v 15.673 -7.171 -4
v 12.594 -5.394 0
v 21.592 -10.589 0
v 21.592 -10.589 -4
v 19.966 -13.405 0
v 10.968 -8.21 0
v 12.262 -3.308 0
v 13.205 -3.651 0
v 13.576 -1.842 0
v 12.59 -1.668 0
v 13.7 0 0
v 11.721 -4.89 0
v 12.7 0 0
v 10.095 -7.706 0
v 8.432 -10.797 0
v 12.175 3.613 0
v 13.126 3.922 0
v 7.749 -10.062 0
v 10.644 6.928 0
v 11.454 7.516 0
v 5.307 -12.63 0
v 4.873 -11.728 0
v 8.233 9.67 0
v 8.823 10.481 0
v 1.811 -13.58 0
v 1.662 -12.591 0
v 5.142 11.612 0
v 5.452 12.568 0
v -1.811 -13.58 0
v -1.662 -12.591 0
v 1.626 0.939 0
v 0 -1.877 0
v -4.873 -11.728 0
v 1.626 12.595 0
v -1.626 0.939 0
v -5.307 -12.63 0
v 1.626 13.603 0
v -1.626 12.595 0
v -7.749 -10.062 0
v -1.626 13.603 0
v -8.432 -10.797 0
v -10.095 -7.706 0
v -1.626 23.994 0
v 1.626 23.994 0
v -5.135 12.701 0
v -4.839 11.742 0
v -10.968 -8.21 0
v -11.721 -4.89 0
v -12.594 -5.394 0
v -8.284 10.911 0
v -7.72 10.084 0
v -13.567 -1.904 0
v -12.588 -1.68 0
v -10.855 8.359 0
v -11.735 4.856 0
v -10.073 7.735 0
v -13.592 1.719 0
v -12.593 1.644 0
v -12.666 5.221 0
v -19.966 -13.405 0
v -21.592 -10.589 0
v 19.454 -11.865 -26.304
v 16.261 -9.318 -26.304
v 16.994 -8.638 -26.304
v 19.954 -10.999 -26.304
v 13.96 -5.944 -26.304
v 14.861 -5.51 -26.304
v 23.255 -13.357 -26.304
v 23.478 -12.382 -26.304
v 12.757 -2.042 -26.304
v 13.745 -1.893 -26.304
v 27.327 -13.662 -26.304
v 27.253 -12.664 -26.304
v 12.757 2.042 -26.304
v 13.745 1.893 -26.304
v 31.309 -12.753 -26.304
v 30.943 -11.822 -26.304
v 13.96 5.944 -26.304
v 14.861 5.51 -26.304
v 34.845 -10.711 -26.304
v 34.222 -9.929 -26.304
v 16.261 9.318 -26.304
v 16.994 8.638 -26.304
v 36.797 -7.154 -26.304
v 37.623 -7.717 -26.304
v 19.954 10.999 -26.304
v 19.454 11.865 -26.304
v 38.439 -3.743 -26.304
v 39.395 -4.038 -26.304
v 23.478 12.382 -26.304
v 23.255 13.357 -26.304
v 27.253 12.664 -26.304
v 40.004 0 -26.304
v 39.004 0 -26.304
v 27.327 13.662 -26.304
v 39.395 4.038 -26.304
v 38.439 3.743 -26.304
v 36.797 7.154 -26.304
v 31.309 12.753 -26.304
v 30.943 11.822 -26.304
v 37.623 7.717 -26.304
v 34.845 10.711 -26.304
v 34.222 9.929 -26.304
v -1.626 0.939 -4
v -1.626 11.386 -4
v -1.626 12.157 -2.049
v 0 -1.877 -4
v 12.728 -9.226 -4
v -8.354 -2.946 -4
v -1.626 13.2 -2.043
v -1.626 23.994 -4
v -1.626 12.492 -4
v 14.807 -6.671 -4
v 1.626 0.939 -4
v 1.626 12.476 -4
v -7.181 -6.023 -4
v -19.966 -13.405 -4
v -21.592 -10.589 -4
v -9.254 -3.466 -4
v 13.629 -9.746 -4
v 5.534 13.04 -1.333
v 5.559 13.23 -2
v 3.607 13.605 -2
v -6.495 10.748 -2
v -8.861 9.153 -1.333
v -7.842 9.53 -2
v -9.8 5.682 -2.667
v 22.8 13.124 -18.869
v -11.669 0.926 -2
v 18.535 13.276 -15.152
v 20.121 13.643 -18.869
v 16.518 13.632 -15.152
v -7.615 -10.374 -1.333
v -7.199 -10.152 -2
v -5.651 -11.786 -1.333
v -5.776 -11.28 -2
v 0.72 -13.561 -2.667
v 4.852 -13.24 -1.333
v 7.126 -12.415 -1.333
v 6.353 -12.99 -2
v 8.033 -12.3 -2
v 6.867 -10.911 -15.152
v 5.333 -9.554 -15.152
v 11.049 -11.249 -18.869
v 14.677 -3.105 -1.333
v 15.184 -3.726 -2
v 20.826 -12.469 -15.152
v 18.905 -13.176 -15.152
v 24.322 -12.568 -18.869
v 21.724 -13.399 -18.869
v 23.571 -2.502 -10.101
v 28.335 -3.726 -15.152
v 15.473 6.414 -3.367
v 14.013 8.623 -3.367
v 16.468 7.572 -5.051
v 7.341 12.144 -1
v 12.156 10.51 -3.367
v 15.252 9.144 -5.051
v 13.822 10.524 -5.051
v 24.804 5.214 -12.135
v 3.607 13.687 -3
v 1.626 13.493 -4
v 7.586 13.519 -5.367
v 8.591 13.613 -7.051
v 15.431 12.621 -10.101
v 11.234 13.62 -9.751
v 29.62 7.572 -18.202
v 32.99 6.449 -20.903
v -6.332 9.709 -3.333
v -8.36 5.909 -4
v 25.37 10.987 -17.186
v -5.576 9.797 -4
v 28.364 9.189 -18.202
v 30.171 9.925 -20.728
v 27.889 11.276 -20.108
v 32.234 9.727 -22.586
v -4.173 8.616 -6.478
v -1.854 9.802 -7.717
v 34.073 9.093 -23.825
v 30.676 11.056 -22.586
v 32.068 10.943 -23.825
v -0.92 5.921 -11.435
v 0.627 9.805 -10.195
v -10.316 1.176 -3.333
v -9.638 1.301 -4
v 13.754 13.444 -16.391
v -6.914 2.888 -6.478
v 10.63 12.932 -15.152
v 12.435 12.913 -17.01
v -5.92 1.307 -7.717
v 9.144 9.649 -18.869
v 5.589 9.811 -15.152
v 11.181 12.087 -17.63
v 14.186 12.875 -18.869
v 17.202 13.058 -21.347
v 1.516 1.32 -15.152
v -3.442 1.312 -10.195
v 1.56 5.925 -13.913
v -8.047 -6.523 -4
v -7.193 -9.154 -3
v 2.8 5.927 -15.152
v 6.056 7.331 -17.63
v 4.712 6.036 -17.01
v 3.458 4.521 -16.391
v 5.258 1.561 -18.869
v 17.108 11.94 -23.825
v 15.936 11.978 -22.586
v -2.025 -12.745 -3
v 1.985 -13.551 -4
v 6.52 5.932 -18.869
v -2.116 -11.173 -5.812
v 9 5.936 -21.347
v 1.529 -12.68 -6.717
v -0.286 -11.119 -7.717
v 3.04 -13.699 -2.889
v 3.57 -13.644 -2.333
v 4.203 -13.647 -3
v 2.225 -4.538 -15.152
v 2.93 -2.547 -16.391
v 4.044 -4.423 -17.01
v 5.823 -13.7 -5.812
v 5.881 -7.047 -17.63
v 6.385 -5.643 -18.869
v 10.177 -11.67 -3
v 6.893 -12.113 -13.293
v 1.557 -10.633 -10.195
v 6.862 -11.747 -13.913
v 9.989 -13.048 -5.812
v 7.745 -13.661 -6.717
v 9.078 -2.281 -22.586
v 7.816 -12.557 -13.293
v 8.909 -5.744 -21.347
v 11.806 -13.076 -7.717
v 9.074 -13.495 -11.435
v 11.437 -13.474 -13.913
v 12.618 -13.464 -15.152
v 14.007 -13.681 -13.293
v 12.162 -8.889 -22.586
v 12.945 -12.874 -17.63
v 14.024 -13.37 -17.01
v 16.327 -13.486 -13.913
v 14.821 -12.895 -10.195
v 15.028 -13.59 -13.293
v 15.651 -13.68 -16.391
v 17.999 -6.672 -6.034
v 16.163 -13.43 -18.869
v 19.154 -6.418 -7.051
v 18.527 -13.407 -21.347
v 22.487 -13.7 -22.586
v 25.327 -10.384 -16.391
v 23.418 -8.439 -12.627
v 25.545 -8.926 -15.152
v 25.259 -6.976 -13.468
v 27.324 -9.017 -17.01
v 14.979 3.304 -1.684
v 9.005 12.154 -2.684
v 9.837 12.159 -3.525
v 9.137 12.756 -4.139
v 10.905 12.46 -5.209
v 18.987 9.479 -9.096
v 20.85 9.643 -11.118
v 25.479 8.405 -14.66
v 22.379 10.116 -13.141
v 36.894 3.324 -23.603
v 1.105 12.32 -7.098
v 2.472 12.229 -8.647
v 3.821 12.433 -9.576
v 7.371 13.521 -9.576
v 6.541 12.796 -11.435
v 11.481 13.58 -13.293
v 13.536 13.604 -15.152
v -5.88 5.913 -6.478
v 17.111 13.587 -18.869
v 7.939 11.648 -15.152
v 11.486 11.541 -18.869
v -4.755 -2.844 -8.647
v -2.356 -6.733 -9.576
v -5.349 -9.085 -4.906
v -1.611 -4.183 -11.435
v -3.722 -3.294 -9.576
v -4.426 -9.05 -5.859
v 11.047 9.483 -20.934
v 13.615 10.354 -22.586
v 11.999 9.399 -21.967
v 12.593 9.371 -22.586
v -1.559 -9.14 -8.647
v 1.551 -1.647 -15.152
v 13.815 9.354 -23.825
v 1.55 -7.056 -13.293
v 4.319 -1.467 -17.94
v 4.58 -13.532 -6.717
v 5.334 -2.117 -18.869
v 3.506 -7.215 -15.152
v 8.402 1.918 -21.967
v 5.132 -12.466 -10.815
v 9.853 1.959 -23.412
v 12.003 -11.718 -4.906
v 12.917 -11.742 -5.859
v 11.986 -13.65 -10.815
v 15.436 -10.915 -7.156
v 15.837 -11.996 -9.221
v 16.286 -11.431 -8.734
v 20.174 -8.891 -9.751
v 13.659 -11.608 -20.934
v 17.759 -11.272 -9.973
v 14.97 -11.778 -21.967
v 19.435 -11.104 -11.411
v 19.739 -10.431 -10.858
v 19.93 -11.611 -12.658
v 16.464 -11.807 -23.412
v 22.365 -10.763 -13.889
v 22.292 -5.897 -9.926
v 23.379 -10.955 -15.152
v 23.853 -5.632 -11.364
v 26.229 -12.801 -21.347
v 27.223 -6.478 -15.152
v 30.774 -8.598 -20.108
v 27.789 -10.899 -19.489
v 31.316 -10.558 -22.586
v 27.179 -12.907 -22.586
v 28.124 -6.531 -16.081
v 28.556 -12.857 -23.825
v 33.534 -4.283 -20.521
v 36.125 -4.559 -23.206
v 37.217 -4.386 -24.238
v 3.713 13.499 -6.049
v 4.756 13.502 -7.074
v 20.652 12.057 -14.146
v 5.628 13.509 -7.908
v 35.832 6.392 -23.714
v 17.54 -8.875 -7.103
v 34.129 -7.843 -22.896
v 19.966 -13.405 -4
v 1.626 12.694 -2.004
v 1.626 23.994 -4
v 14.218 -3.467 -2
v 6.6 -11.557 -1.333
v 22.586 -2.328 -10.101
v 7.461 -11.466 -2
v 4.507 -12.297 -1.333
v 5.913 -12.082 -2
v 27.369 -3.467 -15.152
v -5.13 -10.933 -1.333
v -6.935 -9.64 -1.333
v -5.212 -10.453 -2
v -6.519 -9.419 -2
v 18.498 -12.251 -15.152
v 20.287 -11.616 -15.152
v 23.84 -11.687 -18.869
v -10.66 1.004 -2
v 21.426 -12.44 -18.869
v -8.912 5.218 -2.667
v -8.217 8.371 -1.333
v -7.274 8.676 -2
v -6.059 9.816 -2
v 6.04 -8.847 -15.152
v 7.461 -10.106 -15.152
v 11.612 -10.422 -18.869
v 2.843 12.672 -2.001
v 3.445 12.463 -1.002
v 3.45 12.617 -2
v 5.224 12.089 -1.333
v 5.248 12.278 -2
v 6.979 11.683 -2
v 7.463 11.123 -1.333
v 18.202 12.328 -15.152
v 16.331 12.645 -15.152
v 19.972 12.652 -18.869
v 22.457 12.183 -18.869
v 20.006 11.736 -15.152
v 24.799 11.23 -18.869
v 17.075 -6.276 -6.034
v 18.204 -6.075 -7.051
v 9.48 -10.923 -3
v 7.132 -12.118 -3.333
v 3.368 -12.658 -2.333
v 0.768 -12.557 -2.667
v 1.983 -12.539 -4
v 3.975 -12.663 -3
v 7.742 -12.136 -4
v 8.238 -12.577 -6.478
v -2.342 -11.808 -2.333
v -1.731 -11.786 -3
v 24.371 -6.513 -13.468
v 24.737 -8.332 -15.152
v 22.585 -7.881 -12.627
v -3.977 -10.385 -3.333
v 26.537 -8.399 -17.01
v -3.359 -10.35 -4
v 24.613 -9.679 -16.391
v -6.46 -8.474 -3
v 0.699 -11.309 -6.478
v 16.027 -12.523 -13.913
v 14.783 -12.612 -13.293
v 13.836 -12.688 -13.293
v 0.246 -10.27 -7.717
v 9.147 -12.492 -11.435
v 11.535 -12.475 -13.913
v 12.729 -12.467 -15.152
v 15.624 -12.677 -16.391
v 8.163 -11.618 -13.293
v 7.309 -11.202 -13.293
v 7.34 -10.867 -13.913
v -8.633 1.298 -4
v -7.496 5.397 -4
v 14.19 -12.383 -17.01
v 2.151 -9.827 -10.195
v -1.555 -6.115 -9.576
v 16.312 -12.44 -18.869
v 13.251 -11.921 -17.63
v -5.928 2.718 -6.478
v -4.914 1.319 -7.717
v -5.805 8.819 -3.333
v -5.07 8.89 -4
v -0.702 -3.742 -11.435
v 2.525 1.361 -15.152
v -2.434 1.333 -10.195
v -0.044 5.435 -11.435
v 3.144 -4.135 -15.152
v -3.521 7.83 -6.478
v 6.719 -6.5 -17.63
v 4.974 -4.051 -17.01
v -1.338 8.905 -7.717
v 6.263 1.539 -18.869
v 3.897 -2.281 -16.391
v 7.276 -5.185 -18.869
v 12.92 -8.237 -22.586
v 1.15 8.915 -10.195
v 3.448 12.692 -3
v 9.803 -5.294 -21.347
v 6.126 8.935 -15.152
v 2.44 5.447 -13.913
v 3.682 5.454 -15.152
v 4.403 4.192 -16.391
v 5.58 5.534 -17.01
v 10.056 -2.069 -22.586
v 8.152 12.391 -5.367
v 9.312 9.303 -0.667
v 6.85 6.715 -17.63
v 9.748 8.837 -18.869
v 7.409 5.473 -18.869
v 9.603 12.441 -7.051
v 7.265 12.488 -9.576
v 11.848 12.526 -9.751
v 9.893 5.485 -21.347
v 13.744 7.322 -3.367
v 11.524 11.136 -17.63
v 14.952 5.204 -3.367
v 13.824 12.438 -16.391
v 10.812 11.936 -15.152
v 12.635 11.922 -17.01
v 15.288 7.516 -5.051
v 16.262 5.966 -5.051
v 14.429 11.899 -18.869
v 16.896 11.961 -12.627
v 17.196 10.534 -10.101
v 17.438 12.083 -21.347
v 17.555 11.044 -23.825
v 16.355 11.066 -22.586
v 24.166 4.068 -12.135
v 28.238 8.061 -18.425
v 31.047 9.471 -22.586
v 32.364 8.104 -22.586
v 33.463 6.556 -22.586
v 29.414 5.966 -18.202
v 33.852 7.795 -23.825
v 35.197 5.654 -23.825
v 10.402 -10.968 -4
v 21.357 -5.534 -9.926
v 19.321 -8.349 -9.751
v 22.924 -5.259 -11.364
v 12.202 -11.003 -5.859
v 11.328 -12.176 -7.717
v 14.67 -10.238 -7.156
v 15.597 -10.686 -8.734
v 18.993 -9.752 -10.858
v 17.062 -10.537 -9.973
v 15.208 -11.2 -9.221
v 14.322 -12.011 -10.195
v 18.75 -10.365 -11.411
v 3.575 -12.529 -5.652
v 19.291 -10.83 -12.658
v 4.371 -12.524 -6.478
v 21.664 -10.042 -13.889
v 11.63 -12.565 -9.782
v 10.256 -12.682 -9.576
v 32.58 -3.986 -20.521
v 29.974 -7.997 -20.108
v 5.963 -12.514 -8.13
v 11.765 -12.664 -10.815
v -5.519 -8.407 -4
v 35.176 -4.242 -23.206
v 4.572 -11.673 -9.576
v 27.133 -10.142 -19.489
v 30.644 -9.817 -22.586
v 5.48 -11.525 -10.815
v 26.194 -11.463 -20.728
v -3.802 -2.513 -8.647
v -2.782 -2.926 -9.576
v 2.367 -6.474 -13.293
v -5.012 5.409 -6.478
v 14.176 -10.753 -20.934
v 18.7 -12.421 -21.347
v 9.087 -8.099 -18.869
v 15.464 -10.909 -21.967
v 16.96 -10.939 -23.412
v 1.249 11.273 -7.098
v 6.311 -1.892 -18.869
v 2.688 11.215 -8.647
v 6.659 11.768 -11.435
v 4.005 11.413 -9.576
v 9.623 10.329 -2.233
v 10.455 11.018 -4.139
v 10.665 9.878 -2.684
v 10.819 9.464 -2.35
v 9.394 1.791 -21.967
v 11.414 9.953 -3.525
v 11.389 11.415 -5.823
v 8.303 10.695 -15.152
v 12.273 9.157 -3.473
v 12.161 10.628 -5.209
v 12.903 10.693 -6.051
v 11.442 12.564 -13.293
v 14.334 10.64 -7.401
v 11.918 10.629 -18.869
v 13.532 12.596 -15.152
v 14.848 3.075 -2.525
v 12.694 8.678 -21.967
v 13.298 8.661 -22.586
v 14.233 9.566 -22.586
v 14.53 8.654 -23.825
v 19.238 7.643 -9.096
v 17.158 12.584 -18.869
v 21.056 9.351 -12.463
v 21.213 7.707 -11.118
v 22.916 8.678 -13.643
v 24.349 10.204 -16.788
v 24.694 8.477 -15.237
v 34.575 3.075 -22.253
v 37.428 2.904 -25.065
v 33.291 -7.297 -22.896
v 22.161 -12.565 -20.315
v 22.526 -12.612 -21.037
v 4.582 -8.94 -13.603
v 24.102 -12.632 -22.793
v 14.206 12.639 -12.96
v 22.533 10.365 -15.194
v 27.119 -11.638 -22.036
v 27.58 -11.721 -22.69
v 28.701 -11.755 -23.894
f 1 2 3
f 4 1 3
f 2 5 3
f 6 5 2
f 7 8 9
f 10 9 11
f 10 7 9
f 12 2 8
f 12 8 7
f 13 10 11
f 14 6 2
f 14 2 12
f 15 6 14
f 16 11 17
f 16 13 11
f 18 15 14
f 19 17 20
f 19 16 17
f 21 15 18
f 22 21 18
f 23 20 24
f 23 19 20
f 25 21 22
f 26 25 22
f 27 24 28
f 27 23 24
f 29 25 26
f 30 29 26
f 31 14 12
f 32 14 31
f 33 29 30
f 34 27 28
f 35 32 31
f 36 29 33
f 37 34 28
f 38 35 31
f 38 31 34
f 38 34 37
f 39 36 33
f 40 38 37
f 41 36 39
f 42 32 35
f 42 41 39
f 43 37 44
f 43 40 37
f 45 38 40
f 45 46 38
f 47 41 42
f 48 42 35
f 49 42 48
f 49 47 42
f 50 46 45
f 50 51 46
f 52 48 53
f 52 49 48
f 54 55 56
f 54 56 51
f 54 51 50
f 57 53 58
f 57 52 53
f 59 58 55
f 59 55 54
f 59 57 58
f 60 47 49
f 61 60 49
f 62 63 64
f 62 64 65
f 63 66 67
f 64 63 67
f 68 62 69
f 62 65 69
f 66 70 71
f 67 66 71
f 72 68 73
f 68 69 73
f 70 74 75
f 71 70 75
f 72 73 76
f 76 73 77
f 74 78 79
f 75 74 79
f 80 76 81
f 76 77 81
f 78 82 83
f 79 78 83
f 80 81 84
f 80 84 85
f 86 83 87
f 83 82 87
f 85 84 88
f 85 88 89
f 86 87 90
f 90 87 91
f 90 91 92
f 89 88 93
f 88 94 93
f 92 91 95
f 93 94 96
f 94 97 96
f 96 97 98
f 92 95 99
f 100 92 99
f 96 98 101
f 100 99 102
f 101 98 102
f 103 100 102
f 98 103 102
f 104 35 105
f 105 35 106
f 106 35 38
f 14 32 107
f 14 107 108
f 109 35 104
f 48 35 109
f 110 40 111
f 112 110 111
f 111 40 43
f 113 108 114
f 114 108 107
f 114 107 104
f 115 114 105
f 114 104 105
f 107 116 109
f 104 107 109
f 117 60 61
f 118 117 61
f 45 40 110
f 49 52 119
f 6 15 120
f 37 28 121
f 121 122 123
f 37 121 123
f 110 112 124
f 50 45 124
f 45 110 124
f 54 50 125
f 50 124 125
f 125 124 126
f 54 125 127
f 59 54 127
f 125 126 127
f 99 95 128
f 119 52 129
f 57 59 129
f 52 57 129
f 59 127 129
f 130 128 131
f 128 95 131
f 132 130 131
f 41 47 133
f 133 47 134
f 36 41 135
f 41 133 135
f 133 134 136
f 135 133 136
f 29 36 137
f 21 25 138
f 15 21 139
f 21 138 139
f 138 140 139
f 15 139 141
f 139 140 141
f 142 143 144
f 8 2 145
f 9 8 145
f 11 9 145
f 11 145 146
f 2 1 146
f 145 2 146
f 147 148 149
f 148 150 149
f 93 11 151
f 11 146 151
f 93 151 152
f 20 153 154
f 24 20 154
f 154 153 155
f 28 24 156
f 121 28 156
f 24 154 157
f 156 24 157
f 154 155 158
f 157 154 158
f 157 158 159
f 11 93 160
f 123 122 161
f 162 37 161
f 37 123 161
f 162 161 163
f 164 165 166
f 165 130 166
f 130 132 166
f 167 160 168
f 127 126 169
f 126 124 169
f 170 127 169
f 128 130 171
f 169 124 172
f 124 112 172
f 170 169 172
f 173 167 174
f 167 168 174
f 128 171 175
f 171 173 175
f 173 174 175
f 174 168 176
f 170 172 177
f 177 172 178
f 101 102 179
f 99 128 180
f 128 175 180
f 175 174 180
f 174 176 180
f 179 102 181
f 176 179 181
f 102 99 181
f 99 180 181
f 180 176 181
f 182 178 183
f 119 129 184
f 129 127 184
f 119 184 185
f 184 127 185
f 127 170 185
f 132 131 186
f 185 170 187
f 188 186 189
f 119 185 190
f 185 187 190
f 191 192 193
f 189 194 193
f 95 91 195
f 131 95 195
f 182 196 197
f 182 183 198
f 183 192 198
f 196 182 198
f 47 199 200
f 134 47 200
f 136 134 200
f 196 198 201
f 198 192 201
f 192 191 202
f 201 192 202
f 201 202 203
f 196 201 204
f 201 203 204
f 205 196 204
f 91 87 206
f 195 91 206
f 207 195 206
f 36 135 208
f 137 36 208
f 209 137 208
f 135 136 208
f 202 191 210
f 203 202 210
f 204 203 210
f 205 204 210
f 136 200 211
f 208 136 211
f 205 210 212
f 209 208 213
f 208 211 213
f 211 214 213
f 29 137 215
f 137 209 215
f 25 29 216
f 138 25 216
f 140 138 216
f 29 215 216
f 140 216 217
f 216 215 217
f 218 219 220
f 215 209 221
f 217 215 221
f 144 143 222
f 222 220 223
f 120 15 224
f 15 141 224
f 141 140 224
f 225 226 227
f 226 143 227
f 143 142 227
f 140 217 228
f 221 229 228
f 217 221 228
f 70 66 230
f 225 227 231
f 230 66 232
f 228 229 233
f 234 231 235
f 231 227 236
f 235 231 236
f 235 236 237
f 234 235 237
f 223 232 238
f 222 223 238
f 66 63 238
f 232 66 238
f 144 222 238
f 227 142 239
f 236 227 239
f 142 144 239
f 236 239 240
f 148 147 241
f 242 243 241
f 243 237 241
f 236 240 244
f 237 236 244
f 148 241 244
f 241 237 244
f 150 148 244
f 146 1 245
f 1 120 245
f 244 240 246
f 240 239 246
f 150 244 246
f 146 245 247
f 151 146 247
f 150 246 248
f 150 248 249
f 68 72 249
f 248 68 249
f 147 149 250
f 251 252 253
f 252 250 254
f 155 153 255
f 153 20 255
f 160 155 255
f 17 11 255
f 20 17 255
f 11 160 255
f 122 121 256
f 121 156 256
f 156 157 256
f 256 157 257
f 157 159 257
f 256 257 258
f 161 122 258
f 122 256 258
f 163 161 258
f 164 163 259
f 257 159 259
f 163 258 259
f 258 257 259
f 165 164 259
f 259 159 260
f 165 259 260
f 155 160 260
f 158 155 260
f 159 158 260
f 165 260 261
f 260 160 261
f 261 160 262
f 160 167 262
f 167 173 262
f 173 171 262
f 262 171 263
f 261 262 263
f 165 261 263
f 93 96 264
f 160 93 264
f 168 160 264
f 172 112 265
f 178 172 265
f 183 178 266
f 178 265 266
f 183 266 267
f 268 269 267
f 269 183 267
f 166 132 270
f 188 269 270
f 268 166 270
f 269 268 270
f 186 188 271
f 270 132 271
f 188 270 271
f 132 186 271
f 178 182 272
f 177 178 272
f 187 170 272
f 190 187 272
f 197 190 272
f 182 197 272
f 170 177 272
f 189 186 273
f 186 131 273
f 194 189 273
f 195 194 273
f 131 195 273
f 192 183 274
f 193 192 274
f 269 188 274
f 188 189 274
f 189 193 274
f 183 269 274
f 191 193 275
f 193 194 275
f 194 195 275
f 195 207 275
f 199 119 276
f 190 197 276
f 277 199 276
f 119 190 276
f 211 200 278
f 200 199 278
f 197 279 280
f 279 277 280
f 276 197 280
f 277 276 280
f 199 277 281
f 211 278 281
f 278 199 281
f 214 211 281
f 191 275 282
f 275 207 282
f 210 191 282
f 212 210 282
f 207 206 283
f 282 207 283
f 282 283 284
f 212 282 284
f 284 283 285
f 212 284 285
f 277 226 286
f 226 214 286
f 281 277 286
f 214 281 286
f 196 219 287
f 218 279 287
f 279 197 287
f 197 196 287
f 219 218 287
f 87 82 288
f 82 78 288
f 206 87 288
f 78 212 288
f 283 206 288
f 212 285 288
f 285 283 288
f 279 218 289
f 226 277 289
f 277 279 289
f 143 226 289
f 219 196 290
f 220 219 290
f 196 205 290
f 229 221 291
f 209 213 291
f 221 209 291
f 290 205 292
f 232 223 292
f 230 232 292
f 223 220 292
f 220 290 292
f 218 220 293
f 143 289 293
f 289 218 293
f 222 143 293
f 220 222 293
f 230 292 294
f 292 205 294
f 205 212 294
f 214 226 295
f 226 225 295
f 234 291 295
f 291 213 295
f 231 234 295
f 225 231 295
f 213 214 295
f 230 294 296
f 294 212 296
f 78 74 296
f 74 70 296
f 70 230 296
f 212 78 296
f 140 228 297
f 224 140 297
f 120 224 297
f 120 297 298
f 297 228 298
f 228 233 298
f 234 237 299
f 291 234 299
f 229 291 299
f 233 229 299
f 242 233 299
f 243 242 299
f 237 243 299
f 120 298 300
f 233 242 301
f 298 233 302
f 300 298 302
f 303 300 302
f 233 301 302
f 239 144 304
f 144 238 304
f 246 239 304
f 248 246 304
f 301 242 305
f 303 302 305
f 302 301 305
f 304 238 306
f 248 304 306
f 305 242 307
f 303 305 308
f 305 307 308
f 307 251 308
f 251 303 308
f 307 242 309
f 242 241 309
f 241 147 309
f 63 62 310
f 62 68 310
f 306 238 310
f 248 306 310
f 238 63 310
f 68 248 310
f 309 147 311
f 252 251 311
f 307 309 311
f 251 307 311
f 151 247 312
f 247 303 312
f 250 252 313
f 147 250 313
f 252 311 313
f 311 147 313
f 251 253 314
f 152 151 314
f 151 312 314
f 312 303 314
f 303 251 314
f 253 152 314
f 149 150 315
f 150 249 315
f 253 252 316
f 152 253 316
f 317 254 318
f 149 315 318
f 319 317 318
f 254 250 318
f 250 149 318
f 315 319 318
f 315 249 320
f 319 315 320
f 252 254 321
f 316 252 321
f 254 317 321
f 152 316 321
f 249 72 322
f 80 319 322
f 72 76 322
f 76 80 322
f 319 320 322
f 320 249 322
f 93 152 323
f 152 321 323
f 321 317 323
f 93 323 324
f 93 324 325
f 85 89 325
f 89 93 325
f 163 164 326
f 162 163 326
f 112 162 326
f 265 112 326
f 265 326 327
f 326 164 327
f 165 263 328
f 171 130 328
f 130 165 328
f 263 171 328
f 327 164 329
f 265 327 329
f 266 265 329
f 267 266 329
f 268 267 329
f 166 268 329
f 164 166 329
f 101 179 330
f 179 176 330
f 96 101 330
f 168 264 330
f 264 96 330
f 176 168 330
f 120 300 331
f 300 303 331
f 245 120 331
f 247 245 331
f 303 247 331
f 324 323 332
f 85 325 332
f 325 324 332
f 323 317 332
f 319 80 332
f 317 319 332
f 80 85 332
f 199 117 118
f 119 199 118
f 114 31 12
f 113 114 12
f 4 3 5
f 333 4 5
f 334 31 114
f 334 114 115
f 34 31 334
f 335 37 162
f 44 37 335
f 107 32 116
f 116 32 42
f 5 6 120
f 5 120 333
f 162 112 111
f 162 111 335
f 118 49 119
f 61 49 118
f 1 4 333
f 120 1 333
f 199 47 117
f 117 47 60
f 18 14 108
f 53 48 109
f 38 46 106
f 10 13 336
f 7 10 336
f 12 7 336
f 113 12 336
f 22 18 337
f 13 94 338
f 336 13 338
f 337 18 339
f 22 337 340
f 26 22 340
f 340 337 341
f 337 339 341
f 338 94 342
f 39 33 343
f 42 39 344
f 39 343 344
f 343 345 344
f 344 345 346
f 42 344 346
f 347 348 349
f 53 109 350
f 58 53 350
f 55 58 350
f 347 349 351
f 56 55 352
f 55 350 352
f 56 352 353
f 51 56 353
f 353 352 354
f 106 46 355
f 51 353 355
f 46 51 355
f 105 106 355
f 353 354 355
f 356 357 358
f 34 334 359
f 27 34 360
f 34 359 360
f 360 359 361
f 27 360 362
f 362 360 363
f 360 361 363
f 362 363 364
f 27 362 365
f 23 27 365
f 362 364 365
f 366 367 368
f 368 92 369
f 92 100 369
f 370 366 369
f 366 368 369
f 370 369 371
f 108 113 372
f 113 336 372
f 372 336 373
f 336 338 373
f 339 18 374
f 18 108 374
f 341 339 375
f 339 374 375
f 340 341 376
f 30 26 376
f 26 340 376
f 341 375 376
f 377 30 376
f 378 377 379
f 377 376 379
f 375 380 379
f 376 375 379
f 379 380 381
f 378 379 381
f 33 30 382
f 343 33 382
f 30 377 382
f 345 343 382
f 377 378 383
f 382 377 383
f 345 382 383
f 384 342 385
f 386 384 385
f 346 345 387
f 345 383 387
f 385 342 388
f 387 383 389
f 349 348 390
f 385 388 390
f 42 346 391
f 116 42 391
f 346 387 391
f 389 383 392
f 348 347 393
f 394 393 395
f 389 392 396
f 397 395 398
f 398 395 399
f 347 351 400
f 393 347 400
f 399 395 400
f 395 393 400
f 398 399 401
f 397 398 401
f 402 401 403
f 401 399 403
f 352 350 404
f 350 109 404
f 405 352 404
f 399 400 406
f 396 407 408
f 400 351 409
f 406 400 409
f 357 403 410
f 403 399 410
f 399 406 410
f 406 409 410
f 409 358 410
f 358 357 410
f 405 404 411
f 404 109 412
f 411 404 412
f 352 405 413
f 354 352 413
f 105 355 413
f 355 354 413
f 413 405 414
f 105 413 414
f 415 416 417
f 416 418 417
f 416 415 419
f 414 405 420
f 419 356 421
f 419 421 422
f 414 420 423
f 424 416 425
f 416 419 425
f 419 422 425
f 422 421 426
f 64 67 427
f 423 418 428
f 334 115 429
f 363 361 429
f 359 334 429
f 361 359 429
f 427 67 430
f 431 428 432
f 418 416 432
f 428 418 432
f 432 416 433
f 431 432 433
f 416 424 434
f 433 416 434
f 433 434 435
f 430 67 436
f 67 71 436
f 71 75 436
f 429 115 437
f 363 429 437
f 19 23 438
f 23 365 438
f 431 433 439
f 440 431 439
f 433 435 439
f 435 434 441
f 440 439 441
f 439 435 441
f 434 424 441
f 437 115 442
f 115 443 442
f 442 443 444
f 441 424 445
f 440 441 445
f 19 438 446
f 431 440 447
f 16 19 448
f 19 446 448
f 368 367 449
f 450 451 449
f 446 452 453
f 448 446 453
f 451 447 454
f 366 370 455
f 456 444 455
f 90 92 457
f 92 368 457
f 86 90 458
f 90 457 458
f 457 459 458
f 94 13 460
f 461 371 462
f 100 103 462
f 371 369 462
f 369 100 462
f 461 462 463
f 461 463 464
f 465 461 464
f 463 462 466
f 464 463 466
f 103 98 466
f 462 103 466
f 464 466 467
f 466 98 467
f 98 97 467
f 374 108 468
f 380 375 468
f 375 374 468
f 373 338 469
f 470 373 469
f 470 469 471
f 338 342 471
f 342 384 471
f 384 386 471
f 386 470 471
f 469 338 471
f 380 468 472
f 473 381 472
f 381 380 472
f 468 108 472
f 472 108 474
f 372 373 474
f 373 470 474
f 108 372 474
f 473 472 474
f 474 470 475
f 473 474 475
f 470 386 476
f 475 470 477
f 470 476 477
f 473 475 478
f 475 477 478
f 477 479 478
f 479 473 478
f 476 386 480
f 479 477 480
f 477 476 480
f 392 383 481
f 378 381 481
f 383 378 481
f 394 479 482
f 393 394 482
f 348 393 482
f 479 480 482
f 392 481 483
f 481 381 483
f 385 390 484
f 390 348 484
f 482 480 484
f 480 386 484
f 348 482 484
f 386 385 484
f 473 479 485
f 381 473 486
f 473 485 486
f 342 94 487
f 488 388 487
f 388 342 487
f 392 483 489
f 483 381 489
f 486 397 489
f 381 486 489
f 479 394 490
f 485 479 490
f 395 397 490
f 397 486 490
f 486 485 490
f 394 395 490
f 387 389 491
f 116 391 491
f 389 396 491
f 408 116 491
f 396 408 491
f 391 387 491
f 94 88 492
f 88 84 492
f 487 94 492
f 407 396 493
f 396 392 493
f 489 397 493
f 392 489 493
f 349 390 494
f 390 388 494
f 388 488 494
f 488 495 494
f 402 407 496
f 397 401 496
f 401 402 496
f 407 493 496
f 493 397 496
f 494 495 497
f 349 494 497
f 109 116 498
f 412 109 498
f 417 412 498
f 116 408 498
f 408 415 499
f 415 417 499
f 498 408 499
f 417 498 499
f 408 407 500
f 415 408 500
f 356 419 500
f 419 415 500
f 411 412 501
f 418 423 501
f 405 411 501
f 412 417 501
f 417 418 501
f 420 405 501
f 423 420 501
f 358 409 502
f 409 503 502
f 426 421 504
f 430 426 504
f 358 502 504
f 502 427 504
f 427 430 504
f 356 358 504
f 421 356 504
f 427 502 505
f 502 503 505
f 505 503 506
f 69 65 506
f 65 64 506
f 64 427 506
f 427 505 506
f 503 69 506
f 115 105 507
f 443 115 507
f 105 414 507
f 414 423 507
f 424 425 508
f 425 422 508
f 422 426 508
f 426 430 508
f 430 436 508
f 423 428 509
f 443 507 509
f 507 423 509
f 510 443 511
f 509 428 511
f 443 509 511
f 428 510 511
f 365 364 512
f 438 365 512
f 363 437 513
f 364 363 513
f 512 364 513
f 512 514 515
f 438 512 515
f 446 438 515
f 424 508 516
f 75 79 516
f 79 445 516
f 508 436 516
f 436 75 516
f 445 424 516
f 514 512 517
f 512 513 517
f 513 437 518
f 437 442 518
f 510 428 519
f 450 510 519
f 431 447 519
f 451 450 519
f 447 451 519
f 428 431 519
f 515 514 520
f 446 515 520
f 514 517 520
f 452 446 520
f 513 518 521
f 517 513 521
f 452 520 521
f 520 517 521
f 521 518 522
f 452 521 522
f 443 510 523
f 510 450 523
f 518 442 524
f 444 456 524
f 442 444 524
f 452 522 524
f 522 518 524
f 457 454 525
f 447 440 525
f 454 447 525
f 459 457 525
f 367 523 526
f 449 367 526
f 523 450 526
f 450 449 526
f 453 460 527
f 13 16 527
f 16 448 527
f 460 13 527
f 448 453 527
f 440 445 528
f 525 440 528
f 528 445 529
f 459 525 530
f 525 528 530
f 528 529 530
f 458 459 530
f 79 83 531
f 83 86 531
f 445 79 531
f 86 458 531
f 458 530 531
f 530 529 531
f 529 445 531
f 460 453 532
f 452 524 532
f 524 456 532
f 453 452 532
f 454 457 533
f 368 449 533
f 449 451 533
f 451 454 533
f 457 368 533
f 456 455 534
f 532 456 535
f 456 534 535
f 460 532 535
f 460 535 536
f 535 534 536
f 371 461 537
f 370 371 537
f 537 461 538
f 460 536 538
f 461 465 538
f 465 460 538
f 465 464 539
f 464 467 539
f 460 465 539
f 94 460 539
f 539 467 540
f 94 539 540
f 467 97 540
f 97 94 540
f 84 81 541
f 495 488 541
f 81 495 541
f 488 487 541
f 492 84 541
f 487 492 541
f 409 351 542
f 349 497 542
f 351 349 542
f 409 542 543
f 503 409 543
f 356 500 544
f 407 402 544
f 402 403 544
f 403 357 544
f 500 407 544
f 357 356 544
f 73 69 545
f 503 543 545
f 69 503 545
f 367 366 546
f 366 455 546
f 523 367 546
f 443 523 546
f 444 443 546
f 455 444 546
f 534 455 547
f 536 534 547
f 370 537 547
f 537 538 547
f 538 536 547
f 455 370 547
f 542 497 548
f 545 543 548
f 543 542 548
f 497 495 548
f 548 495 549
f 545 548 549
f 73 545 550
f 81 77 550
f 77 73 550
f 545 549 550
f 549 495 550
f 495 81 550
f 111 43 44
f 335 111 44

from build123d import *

# Parameters (mm, degrees)
ESQUISSE1_R                  = 13.7
ESQUISSE1_R_2                = 12.7
ESQUISSE3_W                  = 3.251730064
ESQUISSE3_H                  = 23.99378428
BOSS_EXTRU_1_DEPTH           = 4
R_P_TITION_CIRCULAIRE1_COUNT = 3


with BuildPart() as part:
    # Balayage1: sweep along a path in Esquisse2
    with BuildLine(Plane(origin=(0, 0, 0), x_dir=(1, 0, 0), z_dir=(0, 1, 0))) as balayage1_path:
        Line((0, 0), (26.30360969, 26.30360969))
    # Esquisse1 → Balayage1 (sweep)
    with BuildSketch(Plane.XY):
        Circle(ESQUISSE1_R)
        Circle(ESQUISSE1_R_2, mode=Mode.SUBTRACT)
    sweep(path=balayage1_path.line)

    # Esquisse3 → Boss.-Extru.1 (add)
    with BuildSketch(Plane.XY):
        with Locations((0, 11.99689214)):
            Rectangle(ESQUISSE3_W, ESQUISSE3_H)
    boss_extru_1 = extrude(amount=-BOSS_EXTRU_1_DEPTH)

    # Répétition circulaire1: Boss.-Extru.1 ×3 about axis
    r_p_tition_circulaire1_axis = Axis((0, 0, 0), (0, 0, 1))
    for i in range(1, R_P_TITION_CIRCULAIRE1_COUNT):
        add(boss_extru_1.rotate(r_p_tition_circulaire1_axis, i * 360 / R_P_TITION_CIRCULAIRE1_COUNT))


solid = part.part
